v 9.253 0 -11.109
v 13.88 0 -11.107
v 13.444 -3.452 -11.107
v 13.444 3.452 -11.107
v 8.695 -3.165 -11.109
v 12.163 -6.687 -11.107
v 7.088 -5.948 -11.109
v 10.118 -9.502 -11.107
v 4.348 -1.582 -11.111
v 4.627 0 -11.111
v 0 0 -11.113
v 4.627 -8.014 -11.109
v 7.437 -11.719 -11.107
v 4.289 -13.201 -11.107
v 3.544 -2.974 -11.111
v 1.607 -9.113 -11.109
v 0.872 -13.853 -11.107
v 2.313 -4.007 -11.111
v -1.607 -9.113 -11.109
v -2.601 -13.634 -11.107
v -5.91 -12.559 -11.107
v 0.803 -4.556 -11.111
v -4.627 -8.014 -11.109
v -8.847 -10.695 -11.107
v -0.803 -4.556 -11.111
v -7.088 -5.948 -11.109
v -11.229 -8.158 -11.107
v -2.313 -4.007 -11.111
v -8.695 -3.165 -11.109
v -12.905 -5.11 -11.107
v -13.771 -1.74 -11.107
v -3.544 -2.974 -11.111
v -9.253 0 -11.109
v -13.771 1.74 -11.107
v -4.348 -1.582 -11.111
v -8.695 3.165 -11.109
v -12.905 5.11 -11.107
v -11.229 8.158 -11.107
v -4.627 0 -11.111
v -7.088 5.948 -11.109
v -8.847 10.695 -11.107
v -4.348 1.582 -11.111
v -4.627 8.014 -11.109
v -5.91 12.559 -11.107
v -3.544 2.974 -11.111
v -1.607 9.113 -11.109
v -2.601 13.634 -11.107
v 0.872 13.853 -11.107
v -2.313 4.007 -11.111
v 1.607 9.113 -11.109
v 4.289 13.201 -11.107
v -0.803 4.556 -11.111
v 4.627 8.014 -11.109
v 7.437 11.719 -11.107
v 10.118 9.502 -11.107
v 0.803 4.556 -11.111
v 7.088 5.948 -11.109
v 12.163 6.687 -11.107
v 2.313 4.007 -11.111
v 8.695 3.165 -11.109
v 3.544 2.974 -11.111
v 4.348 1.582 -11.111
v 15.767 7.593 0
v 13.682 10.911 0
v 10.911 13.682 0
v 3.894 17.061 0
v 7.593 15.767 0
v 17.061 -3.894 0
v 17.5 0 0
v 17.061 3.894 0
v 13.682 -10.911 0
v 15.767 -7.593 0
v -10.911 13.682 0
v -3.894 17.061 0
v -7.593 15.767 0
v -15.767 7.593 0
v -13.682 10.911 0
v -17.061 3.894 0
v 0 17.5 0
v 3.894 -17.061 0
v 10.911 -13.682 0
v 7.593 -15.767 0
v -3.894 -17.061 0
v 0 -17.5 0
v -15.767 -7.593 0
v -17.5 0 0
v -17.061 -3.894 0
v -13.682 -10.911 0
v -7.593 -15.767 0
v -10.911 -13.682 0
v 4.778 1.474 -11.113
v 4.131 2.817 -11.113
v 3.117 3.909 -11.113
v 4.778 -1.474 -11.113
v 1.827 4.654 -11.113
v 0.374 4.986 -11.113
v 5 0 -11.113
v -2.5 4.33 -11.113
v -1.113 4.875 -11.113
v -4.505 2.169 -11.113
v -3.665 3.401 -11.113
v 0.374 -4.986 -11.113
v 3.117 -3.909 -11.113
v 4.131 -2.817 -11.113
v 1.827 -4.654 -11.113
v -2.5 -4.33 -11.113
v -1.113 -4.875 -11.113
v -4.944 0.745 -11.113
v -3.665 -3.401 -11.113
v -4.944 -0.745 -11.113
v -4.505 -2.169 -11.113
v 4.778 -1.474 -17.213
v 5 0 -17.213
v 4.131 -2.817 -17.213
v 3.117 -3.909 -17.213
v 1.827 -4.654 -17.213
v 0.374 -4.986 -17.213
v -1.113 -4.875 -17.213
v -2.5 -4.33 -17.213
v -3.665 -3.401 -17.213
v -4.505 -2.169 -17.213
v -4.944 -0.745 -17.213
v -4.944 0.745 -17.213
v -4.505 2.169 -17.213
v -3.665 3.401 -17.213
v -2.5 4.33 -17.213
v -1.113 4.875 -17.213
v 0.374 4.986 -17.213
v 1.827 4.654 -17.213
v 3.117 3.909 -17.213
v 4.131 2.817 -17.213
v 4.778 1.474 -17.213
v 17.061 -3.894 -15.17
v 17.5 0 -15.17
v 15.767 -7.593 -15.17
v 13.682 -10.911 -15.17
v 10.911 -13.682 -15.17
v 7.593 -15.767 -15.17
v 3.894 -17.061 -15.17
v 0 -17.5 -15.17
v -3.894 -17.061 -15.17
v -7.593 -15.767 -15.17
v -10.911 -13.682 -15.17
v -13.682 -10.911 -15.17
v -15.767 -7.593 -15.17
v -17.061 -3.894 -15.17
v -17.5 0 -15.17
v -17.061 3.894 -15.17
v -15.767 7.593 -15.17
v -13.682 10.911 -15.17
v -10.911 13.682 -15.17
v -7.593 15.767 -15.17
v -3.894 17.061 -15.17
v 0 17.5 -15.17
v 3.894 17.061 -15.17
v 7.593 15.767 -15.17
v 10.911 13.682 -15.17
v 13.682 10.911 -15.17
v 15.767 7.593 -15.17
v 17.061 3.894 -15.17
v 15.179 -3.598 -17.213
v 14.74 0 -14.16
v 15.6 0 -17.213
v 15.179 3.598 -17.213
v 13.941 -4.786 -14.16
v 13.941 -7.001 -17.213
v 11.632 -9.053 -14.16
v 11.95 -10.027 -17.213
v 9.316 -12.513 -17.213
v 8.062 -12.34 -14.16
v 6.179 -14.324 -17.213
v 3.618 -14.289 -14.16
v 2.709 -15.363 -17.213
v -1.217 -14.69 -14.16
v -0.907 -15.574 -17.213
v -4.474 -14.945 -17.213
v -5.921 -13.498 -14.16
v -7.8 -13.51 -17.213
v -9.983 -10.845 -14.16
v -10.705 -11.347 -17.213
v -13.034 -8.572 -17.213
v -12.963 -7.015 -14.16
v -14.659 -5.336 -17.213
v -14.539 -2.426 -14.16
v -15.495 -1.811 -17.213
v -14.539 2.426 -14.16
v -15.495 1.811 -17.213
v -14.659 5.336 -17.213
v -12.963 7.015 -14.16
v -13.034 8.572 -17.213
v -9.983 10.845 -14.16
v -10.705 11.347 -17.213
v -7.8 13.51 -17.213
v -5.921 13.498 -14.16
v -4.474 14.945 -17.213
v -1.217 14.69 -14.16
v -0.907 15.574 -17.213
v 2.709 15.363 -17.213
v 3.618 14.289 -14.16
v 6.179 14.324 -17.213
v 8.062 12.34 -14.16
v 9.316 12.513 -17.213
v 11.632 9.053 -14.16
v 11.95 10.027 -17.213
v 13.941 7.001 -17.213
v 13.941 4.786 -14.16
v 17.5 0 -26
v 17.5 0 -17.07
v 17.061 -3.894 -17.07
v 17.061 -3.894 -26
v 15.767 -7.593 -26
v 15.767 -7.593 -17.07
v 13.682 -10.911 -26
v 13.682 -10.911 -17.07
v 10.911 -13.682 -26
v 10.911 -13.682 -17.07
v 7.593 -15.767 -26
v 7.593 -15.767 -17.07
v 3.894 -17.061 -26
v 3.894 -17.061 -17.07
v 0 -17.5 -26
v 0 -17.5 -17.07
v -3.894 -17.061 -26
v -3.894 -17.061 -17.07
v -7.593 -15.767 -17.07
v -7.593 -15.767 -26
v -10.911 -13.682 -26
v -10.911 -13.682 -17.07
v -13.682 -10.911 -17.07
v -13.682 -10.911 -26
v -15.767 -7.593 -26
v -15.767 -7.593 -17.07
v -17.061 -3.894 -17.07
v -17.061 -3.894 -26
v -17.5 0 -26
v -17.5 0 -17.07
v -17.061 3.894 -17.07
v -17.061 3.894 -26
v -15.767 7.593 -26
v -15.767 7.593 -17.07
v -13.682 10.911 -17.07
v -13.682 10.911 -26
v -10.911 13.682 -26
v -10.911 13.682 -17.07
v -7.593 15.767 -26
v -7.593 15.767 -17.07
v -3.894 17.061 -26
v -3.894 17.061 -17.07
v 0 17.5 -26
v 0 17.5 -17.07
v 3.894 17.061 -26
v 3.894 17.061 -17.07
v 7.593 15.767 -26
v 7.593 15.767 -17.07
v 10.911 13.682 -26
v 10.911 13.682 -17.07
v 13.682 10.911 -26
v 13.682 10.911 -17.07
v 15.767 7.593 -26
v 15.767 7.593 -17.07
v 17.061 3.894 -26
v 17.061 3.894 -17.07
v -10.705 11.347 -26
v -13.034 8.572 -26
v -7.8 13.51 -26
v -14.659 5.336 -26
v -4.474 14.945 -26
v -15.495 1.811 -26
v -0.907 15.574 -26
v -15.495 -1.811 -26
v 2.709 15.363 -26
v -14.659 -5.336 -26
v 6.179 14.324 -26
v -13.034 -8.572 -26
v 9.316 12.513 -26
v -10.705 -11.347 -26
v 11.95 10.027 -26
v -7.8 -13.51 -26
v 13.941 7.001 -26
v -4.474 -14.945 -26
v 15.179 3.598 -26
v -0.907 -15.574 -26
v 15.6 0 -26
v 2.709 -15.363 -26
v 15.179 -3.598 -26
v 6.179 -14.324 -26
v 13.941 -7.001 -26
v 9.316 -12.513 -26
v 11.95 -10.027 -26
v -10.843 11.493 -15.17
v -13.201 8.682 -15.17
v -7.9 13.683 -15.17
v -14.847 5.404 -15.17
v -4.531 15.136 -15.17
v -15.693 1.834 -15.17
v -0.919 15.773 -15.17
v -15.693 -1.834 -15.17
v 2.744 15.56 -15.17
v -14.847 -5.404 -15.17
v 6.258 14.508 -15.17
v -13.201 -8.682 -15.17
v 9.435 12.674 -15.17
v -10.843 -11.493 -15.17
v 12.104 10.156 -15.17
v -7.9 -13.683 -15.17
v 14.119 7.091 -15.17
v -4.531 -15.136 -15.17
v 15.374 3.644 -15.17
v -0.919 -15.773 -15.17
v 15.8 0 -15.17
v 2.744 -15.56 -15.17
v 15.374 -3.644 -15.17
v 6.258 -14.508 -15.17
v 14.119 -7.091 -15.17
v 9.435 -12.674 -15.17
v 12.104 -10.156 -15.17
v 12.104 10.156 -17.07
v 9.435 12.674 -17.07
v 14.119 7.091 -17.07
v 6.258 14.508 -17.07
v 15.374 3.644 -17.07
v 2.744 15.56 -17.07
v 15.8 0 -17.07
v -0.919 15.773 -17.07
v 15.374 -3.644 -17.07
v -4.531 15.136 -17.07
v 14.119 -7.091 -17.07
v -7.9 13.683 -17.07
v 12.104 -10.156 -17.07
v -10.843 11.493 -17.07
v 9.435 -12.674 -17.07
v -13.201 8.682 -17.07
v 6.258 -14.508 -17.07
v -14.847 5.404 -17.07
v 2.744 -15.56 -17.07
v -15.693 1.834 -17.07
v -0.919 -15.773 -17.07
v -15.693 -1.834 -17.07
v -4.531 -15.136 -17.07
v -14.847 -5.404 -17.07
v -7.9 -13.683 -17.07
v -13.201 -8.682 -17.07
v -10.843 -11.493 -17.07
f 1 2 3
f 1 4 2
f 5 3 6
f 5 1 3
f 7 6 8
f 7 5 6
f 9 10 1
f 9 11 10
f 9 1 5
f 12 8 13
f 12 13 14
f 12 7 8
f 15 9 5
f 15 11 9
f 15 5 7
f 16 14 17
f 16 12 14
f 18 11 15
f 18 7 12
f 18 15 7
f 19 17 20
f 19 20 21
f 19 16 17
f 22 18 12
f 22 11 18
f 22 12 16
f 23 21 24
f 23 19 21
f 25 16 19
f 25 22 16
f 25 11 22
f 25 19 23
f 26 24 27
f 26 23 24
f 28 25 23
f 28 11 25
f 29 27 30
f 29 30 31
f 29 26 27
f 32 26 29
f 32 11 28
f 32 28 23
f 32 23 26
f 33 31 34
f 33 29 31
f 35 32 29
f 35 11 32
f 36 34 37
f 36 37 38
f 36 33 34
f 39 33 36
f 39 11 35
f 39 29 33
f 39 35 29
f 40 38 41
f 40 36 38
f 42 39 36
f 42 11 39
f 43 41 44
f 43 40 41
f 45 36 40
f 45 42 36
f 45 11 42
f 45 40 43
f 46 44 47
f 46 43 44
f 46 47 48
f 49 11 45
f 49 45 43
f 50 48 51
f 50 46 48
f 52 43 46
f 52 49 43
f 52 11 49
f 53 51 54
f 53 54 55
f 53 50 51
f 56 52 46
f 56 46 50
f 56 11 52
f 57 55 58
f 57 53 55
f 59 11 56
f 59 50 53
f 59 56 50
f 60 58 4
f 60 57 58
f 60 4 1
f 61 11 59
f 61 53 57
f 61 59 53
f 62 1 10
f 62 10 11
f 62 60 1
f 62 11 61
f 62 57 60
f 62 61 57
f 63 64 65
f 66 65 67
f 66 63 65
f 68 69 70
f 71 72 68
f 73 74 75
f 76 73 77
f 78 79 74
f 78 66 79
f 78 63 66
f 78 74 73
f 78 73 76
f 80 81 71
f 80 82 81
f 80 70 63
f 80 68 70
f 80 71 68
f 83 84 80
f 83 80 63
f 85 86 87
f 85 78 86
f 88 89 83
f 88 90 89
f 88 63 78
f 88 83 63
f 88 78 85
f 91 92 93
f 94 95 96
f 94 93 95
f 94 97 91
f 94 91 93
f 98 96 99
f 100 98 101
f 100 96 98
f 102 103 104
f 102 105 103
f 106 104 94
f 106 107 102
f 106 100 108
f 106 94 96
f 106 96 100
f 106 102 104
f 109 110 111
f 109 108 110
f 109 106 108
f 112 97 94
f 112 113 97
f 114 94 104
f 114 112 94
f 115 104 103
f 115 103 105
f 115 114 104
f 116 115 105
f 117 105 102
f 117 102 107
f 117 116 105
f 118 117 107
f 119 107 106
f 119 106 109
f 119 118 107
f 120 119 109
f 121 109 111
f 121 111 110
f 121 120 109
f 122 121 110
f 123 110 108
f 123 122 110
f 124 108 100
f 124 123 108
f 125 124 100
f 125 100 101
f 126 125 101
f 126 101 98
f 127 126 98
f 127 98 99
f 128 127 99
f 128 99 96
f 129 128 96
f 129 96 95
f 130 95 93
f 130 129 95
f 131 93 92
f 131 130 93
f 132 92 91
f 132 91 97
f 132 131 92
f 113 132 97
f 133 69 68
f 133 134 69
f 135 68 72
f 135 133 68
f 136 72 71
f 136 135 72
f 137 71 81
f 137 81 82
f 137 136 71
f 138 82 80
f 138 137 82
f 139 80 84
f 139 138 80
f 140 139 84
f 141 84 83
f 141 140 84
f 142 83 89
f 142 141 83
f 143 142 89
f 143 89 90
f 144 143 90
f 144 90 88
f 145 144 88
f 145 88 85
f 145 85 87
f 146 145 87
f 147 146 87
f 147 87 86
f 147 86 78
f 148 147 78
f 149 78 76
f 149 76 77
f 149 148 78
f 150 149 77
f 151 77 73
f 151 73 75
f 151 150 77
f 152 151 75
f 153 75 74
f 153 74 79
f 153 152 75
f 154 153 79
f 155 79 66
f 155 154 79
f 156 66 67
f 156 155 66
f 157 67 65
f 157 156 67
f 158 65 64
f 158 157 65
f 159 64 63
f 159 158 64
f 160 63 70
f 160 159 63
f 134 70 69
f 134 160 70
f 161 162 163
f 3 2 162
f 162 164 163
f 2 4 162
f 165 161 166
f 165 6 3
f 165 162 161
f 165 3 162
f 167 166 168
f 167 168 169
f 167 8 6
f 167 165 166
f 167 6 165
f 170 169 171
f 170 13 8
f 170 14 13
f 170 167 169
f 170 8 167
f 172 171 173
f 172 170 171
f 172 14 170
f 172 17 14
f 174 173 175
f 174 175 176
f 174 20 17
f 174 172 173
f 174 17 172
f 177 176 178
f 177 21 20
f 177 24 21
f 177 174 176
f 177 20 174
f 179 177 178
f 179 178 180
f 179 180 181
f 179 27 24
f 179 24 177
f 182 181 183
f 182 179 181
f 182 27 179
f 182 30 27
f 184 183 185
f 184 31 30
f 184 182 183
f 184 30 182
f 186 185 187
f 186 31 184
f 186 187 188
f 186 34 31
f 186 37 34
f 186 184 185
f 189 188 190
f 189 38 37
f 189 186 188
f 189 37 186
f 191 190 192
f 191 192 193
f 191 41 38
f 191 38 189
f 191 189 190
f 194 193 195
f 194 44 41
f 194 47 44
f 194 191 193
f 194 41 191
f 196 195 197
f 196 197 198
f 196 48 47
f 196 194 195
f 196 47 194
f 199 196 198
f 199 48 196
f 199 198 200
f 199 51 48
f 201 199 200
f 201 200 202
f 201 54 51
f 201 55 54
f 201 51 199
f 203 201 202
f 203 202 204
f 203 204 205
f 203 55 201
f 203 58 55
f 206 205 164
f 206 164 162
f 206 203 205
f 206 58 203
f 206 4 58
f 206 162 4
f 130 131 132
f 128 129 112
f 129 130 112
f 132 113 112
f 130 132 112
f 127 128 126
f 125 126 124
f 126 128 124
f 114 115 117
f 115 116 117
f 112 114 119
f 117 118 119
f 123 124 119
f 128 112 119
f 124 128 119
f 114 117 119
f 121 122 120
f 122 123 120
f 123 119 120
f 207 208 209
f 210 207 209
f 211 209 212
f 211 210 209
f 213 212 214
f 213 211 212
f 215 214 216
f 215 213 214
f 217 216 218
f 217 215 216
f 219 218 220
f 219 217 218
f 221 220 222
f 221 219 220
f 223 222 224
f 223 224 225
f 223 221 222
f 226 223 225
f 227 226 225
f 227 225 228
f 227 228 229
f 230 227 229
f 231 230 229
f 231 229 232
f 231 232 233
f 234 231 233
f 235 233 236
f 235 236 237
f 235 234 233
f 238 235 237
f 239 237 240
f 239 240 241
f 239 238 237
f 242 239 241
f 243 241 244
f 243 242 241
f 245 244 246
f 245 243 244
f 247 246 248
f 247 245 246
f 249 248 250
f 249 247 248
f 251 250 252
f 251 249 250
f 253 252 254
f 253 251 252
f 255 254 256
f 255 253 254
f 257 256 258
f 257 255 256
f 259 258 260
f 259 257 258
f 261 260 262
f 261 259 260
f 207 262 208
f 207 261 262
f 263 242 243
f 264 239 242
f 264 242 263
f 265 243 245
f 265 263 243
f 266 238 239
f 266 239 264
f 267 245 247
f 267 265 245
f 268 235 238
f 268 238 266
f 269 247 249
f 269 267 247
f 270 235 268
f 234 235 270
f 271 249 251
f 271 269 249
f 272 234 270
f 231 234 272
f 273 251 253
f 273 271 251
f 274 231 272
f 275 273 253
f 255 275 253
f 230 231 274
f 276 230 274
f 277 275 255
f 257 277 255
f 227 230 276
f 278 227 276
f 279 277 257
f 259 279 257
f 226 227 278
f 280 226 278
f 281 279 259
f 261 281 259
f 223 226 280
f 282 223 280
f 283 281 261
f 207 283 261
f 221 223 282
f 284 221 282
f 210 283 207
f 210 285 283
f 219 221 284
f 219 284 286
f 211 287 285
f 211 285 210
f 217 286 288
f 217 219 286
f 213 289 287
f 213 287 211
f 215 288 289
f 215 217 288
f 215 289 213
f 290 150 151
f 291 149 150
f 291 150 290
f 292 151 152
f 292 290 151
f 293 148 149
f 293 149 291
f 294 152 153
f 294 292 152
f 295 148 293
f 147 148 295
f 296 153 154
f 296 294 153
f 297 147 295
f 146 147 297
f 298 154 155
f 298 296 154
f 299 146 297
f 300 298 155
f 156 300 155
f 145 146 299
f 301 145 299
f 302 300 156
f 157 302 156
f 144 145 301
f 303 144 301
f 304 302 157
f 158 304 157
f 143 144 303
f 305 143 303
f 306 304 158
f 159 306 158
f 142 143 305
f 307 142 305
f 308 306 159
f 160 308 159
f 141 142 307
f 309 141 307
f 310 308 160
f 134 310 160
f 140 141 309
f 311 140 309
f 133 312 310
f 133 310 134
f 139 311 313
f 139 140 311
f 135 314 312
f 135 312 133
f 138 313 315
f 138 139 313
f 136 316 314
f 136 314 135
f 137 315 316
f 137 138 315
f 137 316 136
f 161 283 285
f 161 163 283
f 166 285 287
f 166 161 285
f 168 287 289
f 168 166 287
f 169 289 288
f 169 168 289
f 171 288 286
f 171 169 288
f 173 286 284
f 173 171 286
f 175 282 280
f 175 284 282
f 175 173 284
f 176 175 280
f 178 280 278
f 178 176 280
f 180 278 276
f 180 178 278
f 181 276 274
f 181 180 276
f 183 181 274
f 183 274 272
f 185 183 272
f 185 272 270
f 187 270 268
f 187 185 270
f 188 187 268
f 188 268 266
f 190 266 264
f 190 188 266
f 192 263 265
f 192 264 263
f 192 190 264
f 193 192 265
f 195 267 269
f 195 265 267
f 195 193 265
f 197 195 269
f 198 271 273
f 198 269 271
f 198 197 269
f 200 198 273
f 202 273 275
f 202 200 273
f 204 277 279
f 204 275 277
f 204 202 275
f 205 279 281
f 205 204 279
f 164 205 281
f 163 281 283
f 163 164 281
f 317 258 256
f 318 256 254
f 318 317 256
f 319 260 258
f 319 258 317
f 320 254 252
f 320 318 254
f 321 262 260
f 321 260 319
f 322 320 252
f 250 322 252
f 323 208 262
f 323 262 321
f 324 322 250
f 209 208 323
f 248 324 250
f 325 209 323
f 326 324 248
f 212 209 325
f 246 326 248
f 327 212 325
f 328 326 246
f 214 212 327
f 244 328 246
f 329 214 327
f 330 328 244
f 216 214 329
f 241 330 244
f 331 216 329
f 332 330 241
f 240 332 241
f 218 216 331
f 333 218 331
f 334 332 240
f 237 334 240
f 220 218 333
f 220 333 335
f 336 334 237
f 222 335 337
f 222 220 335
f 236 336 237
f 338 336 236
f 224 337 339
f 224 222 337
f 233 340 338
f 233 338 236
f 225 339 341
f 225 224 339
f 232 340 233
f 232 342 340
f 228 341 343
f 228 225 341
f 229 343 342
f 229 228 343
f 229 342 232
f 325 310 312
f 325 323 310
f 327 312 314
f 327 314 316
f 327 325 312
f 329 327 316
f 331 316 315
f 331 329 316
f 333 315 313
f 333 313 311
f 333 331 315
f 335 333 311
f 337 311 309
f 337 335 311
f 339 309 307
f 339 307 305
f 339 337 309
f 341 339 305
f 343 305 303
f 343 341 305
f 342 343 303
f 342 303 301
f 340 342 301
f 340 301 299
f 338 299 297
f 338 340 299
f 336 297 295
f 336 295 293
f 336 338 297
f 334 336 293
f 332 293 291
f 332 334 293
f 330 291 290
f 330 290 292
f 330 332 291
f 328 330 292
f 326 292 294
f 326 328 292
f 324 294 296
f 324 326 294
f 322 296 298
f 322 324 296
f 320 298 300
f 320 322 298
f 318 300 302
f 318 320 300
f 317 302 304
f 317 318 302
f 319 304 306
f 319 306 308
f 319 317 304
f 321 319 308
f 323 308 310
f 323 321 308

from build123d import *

# Parameters (mm, degrees)
CROQUIS8_W = 5
CROQUIS8_H = 6.1


with BuildPart() as part:
    # Croquis6 → Revolución1 (revolve)
    with BuildSketch(Plane(origin=(0, 0, 0), x_dir=(1, 0, 0), z_dir=(0, 1, 0))):
        Polygon((17.5, 15.169836957), (15.8, 15.169836957), (15.8, 17.069836957), (17.5, 17.069836957), (17.5, 26), (0, 26), (0, 0), (17.5, 0), align=None)
    revolve(axis=Axis((0, 0, 0), (0, 0, -1)))

    # Croquis7 → Cortar-Revolución1 (revolve, cut)
    with BuildSketch(Plane(origin=(0, 0, 0), x_dir=(1, 0, 0), z_dir=(0, 1, 0))):
        Polygon((0, 26.013313624), (15.6, 26.013313624), (15.6, 17.213313624), (13.88, 11.106656812), (0, 11.113313624), align=None)
    revolve(axis=Axis((0, 0, 0), (0, 0, -1)), mode=Mode.SUBTRACT)


with BuildPart() as body_2:
    # Croquis8 → Revolución4 (revolve)
    with BuildSketch(Plane(origin=(0, 0, 0), x_dir=(1, 0, 0), z_dir=(0, 1, 0))):
        with Locations((2.5, 14.163313624)):
            Rectangle(CROQUIS8_W, CROQUIS8_H)
    revolve(axis=Axis((0, 0, 0), (0, 0, -1)))


solid = Compound([part.part, body_2.part])
